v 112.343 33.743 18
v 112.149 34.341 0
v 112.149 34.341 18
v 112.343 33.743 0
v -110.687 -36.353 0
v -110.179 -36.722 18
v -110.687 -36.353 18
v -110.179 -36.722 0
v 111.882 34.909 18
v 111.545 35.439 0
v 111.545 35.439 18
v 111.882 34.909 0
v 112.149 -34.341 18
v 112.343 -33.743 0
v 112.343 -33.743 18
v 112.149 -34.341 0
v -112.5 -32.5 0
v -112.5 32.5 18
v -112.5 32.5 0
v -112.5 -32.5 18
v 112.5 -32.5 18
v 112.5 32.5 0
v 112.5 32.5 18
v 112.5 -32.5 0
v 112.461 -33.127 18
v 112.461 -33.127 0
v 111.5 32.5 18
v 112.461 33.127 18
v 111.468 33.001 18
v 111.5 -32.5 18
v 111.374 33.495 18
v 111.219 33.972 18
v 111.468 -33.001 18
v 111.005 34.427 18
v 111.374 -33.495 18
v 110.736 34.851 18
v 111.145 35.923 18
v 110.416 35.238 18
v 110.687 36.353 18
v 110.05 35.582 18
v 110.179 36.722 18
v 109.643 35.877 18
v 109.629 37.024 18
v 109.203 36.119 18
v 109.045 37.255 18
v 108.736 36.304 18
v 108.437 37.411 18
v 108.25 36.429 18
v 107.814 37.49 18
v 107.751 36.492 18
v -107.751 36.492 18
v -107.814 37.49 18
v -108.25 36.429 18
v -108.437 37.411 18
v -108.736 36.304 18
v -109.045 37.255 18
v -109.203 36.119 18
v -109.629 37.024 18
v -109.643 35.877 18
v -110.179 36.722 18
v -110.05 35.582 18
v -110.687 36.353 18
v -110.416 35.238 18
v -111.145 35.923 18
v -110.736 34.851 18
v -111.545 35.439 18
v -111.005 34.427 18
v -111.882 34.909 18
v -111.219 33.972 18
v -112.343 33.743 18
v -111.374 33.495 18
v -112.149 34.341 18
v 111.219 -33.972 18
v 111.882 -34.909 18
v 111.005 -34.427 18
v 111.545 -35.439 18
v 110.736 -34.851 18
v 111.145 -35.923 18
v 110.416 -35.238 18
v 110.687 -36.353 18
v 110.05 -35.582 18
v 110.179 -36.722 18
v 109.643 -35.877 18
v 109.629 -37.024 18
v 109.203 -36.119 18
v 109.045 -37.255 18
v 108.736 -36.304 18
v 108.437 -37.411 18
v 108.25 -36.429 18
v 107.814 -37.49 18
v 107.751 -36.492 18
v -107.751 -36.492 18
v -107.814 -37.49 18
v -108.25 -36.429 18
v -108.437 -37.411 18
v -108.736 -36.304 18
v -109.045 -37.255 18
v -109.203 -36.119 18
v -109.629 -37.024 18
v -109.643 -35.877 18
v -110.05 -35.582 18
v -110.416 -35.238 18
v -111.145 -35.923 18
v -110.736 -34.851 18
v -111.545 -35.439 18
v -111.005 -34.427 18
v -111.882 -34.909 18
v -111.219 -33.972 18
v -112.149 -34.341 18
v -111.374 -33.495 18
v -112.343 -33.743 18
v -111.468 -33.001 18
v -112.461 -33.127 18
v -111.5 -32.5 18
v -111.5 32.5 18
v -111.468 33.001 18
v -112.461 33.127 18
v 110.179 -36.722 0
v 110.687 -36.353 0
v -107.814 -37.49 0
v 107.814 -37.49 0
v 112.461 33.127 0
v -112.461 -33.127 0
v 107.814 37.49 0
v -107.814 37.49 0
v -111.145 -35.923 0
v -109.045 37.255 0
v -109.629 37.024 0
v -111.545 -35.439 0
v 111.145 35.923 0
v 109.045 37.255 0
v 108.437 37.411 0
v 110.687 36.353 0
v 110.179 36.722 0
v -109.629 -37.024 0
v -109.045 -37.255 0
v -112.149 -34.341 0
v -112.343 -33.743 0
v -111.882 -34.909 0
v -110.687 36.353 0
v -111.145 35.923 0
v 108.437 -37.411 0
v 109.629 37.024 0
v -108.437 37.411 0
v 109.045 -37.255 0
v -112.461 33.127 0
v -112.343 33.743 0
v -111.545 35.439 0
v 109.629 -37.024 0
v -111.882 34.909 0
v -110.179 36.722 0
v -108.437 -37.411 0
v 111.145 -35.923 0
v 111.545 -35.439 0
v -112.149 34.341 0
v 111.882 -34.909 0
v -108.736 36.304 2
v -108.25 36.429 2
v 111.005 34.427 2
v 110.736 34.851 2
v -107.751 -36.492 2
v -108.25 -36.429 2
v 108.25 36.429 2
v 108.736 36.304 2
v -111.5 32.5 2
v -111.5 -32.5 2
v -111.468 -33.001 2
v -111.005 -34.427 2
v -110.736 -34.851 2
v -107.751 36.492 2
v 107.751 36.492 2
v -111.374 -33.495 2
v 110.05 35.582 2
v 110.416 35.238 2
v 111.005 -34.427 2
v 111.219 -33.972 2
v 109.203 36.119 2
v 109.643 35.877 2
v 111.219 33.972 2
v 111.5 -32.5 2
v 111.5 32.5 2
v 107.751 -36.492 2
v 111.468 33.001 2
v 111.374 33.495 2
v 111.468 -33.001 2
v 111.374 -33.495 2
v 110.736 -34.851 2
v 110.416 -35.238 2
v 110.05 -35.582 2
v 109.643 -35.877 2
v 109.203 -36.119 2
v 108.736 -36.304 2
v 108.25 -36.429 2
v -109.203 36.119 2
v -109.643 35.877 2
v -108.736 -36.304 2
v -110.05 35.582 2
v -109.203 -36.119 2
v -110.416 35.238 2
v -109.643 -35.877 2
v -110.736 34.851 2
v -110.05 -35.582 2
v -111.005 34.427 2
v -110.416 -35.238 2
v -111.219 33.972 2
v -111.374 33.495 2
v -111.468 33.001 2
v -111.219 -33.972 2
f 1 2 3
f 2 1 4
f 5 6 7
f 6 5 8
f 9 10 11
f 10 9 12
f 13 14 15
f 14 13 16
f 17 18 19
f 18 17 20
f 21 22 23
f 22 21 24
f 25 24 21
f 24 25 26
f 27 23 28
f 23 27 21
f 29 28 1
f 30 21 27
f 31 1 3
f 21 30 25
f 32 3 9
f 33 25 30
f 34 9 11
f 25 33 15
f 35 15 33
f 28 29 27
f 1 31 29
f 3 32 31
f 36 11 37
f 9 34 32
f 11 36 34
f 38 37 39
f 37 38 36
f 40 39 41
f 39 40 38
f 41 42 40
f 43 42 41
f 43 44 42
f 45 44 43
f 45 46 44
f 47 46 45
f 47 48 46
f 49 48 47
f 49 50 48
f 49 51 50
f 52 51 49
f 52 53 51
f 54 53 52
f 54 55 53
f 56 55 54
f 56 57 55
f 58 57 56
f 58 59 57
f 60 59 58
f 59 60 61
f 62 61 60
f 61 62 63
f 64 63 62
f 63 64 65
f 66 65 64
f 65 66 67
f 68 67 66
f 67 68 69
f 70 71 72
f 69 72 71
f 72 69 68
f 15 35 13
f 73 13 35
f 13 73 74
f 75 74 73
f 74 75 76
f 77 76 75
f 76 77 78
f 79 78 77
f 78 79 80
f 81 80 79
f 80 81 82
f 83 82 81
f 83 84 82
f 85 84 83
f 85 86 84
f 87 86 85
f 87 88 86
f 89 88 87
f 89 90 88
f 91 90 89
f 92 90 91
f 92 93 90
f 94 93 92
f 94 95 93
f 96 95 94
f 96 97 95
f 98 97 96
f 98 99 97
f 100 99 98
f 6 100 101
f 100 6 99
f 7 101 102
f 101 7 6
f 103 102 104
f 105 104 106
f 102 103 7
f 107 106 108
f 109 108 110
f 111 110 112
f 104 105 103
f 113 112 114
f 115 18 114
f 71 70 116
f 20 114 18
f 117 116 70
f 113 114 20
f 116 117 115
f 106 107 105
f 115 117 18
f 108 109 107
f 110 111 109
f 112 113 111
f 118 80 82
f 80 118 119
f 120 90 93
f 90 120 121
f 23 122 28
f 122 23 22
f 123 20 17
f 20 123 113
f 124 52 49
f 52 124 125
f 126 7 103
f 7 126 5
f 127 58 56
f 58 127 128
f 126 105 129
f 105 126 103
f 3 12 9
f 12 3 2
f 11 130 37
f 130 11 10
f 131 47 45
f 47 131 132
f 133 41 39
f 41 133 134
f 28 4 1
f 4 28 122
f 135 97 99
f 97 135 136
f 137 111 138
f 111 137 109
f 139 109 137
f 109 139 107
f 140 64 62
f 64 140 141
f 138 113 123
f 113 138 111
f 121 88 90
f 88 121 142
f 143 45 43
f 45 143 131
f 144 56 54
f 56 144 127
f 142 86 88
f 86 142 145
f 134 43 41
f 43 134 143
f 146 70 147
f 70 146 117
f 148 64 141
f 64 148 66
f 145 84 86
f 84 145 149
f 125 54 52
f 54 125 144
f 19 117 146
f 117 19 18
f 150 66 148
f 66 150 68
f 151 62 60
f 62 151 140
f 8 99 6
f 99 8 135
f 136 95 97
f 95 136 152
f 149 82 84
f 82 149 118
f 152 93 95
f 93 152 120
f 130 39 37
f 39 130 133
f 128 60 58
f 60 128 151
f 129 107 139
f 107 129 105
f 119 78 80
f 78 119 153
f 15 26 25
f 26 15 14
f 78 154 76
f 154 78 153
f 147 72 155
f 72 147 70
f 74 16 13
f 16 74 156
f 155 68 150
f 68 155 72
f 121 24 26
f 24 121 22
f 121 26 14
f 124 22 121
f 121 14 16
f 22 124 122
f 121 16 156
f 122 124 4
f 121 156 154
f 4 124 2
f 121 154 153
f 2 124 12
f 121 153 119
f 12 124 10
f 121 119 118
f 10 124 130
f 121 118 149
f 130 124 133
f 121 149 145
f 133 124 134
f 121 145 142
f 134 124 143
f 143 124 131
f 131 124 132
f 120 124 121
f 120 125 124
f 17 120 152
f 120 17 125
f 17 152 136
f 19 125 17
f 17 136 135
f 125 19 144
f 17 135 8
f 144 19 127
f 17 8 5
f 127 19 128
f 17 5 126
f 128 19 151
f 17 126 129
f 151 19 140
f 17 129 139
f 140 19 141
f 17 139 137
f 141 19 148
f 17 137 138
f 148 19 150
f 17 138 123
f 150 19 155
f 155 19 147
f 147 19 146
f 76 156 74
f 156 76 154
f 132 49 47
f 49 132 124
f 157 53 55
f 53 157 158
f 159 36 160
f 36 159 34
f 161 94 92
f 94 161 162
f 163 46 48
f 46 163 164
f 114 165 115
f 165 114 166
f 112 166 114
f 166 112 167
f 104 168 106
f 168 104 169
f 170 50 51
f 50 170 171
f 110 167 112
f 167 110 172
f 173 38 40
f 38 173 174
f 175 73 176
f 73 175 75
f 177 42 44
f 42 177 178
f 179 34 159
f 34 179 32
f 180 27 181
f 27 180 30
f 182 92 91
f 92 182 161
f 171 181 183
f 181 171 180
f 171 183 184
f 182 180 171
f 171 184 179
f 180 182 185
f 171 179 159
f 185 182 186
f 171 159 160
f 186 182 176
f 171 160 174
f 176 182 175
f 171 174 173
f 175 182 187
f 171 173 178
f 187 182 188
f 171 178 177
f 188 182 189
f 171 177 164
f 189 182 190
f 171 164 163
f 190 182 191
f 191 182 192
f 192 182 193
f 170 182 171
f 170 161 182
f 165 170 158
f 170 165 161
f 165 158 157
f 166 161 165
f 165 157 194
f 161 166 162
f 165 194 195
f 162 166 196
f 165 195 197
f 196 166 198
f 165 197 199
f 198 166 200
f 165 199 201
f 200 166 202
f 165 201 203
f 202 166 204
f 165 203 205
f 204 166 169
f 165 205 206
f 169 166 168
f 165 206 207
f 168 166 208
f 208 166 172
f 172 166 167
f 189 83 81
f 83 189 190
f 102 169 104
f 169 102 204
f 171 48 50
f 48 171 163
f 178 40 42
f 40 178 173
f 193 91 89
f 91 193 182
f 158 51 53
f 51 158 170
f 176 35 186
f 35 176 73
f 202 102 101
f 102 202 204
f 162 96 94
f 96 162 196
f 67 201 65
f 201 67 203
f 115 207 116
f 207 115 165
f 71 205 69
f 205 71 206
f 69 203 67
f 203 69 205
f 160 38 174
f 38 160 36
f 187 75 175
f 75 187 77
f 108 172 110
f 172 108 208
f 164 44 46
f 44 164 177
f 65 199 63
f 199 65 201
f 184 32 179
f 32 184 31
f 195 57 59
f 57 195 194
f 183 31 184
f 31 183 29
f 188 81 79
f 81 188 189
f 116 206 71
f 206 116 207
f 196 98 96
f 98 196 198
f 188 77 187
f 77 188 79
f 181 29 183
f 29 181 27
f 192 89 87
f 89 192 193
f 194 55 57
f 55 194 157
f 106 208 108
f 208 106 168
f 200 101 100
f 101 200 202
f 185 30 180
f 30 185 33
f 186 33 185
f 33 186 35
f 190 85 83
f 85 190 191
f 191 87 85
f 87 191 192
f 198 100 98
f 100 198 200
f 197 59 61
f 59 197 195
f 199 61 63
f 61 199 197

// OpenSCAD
$fn = 50;


difference() {
	union() {
		hull() {
			translate(v = [-107.5000000000, 32.5000000000, 0]) {
				cylinder(h = 18, r = 5);
			}
			translate(v = [107.5000000000, 32.5000000000, 0]) {
				cylinder(h = 18, r = 5);
			}
			translate(v = [-107.5000000000, -32.5000000000, 0]) {
				cylinder(h = 18, r = 5);
			}
			translate(v = [107.5000000000, -32.5000000000, 0]) {
				cylinder(h = 18, r = 5);
			}
		}
	}
	union() {
		translate(v = [0, 0, 2]) {
			hull() {
				translate(v = [-107.5000000000, 32.5000000000, 0]) {
					cylinder(h = 16, r = 4);
				}
				translate(v = [107.5000000000, 32.5000000000, 0]) {
					cylinder(h = 16, r = 4);
				}
				translate(v = [-107.5000000000, -32.5000000000, 0]) {
					cylinder(h = 16, r = 4);
				}
				translate(v = [107.5000000000, -32.5000000000, 0]) {
					cylinder(h = 16, r = 4);
				}
			}
		}
	}
}
